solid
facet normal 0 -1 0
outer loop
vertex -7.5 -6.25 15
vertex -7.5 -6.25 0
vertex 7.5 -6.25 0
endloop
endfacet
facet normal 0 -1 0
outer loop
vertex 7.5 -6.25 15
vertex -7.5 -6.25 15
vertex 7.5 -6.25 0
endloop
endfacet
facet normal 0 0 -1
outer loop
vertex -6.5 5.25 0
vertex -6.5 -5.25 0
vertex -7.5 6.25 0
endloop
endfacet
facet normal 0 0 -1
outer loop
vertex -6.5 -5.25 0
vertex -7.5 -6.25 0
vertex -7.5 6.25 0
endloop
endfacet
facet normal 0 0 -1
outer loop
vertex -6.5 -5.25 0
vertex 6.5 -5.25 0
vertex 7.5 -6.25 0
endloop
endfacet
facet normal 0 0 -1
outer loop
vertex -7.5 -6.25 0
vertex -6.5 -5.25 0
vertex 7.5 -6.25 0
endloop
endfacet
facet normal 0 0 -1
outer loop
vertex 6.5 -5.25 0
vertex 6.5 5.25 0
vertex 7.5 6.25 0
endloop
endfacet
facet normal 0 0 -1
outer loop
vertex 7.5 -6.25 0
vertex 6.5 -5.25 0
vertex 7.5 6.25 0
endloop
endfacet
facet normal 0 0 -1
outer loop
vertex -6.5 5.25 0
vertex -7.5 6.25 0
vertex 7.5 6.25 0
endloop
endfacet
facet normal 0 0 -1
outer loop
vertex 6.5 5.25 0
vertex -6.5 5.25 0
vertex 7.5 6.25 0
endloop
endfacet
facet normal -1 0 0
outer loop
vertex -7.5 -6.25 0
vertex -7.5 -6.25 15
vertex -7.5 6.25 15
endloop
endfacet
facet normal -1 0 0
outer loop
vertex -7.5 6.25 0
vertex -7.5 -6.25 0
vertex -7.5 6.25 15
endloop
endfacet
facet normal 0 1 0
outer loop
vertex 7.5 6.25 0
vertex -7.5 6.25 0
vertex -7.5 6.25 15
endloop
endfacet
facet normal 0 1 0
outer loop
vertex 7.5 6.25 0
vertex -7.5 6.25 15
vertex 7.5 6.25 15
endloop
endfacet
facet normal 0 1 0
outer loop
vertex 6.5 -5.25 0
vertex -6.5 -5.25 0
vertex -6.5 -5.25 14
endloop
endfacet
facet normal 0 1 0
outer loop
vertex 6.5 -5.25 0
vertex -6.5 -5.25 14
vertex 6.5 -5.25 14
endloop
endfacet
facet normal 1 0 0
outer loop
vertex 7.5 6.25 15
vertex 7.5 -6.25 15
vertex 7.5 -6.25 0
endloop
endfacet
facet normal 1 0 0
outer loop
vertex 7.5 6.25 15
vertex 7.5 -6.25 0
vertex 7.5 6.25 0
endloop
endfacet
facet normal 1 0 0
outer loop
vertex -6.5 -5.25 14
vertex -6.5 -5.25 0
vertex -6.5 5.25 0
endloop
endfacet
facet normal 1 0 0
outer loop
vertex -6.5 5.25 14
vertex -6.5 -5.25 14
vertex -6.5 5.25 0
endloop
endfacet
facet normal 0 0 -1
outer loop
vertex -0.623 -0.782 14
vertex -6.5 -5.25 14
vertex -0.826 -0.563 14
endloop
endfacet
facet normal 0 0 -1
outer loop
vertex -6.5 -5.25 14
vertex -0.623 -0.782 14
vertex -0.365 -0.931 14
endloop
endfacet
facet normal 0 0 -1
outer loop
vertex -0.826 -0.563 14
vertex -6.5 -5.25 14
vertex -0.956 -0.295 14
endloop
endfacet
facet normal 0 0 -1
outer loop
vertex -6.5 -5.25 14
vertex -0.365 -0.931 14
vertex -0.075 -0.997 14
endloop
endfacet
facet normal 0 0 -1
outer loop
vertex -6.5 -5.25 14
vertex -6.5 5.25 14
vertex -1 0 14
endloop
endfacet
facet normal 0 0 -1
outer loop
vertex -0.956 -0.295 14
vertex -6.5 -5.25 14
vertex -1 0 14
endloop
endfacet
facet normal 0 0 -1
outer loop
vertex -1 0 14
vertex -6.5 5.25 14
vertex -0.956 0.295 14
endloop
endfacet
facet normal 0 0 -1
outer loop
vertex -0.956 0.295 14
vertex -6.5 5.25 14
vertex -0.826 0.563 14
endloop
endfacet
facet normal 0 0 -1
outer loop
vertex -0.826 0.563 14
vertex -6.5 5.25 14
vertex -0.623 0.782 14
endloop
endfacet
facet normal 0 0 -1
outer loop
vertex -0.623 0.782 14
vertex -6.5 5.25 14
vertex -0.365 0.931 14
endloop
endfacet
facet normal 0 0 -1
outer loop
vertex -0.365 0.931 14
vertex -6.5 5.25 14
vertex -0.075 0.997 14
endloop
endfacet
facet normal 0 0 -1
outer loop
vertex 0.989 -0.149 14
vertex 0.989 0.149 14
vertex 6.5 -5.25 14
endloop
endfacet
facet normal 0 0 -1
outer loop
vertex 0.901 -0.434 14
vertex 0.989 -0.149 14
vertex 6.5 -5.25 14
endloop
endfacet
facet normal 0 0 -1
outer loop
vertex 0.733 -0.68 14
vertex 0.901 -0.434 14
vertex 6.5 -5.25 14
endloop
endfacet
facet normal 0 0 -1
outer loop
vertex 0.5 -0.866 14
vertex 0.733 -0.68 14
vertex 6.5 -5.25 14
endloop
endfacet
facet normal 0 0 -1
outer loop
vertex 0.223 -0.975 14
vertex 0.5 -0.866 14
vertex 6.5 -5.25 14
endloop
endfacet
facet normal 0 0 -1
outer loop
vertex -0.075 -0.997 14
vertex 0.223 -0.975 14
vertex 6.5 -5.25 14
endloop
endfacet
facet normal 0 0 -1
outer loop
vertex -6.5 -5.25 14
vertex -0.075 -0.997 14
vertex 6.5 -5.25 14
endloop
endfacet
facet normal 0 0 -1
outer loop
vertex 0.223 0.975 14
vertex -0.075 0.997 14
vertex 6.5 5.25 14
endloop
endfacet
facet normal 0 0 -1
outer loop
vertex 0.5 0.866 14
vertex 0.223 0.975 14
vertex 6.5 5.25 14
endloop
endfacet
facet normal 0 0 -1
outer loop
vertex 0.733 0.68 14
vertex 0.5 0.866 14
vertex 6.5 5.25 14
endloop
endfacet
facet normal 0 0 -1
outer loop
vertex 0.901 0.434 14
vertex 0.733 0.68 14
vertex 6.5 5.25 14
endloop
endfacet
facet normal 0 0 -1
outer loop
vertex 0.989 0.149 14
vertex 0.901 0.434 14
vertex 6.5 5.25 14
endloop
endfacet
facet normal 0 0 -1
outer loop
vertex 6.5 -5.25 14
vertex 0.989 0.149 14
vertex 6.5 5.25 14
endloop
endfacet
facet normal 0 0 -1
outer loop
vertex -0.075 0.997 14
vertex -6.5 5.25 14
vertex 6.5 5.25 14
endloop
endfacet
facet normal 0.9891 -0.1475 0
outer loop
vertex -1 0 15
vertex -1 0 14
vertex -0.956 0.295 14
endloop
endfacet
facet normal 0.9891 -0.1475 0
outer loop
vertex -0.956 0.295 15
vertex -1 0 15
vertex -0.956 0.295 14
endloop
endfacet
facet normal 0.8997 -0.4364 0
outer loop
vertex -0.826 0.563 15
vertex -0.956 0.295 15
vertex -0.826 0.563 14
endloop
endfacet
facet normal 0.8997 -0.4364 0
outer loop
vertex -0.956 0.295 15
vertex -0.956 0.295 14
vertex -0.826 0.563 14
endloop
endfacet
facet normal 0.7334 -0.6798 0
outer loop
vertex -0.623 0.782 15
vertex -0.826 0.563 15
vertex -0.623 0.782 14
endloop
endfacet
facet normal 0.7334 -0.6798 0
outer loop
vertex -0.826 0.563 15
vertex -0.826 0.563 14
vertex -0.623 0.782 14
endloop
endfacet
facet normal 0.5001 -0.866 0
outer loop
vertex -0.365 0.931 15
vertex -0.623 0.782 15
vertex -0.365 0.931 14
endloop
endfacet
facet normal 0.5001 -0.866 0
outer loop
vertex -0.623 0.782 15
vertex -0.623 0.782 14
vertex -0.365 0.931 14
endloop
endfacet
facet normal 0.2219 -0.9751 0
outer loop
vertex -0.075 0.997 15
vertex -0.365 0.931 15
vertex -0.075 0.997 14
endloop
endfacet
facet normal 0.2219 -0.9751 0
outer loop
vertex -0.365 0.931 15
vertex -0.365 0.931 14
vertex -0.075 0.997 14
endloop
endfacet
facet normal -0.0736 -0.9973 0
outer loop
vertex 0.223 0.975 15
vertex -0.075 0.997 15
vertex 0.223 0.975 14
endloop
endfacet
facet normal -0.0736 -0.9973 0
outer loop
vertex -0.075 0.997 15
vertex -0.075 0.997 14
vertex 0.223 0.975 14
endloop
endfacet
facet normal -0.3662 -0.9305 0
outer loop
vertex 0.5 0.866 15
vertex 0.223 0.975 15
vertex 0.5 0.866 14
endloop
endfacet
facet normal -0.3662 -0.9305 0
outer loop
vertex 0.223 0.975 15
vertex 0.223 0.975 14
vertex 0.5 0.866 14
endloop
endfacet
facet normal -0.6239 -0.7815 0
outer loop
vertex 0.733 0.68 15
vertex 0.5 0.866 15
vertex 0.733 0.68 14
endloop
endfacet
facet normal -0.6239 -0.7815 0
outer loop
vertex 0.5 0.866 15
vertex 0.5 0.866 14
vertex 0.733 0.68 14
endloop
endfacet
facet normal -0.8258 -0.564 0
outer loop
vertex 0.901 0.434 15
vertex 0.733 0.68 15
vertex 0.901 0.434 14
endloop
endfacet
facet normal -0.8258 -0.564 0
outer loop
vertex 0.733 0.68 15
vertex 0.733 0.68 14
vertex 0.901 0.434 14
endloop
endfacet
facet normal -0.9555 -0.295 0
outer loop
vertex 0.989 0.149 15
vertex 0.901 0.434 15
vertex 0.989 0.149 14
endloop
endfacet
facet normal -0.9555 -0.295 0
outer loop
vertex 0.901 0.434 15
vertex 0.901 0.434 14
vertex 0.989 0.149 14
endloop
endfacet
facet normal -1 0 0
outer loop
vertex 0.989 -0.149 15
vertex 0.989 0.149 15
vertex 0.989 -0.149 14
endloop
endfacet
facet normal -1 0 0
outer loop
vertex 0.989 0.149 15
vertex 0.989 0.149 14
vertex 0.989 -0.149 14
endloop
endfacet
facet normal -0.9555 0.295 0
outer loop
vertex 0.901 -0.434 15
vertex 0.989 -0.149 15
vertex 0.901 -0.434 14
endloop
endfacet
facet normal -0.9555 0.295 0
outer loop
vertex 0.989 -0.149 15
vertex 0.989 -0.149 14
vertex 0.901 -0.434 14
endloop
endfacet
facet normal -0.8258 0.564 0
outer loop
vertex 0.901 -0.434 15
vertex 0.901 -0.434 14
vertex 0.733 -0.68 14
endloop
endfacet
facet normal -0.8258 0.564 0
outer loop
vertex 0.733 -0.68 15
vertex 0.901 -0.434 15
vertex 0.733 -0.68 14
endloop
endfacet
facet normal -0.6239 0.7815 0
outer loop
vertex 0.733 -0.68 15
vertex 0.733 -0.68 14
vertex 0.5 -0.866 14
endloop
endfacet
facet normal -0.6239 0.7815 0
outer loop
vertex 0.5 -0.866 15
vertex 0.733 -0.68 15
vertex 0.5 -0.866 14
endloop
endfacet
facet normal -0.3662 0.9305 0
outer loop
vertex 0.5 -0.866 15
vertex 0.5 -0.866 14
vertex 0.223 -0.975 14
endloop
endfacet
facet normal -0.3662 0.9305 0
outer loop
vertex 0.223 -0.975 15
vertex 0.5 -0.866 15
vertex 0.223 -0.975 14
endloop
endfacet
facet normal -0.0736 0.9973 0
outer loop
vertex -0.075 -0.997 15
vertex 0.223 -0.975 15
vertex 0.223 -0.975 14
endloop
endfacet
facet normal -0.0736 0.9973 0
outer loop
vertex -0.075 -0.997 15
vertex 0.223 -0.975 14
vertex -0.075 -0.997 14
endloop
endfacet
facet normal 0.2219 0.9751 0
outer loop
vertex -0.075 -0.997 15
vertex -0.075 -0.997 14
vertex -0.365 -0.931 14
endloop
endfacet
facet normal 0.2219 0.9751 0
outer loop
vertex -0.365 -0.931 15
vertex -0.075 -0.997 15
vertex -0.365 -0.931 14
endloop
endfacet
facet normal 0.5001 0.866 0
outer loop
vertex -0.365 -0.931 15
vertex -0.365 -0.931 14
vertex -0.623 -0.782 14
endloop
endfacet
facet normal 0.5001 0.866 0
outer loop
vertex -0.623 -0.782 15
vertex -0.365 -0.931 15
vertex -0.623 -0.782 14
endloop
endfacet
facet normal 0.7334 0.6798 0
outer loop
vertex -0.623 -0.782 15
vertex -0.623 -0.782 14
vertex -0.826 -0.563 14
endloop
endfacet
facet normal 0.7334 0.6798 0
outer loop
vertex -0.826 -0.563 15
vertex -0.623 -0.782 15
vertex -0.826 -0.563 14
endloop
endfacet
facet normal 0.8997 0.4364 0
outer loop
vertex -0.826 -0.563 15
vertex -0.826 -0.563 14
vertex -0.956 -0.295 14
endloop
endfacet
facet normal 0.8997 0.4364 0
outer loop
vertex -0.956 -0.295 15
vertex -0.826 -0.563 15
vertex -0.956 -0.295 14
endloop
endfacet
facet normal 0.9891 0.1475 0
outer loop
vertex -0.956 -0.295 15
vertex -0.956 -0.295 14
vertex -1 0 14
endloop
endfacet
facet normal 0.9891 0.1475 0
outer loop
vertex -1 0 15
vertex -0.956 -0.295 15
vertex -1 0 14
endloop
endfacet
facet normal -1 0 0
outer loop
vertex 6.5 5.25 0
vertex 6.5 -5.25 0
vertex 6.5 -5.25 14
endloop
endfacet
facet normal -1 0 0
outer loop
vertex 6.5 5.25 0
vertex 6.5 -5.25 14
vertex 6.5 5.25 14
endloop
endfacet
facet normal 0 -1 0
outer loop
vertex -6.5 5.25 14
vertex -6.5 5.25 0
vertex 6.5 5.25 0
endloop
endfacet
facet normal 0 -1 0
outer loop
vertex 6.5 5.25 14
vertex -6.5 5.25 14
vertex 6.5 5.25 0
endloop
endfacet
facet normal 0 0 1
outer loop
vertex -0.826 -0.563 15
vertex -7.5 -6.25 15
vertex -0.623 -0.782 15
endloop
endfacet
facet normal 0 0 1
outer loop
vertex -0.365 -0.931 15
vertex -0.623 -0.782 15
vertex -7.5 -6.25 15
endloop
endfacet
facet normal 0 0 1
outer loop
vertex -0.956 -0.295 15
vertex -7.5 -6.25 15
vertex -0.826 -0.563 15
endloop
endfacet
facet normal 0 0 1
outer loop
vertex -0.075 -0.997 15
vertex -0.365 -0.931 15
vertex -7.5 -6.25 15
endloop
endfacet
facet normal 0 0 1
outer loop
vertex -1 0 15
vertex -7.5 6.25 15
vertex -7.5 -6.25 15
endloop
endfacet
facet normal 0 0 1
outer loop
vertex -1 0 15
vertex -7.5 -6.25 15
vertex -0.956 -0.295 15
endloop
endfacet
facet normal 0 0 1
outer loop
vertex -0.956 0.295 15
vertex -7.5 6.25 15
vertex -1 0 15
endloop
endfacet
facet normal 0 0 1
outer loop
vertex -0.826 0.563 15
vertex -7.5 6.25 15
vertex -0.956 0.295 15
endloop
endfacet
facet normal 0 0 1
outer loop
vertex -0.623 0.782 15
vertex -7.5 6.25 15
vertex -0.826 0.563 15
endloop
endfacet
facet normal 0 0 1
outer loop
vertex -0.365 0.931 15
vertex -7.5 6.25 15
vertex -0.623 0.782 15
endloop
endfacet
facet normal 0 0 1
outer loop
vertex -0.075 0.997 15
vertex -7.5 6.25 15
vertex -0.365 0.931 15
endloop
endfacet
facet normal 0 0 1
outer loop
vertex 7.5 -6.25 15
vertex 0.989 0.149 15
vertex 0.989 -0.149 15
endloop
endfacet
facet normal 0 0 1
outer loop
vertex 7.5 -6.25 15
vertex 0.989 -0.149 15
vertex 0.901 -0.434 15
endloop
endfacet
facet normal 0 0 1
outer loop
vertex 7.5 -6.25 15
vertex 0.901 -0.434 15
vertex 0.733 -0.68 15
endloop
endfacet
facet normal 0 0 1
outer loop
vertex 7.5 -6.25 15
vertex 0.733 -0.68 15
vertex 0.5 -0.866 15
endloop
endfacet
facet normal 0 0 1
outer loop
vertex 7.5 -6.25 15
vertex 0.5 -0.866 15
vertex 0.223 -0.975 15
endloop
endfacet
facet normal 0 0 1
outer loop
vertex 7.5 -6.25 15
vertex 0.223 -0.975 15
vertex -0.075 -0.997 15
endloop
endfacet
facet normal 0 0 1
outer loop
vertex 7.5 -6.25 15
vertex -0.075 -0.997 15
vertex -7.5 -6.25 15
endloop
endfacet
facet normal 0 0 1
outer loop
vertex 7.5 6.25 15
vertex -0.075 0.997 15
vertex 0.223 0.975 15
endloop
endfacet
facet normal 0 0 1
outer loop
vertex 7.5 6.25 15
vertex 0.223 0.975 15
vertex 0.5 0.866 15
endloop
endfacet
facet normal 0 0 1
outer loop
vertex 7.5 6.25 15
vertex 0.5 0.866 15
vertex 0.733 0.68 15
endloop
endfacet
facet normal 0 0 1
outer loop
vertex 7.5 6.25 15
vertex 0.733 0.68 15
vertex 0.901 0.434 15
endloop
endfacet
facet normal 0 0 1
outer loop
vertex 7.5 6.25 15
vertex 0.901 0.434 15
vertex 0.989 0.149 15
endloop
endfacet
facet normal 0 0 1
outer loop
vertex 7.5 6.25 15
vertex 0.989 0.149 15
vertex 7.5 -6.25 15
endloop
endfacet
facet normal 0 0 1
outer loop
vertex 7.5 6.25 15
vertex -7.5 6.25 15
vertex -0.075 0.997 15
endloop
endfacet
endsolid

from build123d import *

# Parameters (mm, degrees)
F0_W     = 15
F0_H     = 12.5
F1_DEPTH = 15
F2_T     = -1
F4_D     = 2


with BuildPart() as f1:
    # F0 (on Top) → F1 (new body)
    with BuildSketch(Plane.XY):
        Rectangle(F0_W, F0_H)
    extrude(amount=F1_DEPTH)

    # F2
    f2_openings = [f1.faces().sort_by_distance(p)[0] for p in [
        (0, 0, 0),
    ]]
    offset(amount=F2_T, openings=f2_openings)

    # F4 (through all)
    with Locations(Plane.XY.offset(15)):
        with Locations((0, 0)):
            Hole(F4_D / 2)


solid = f1.part
